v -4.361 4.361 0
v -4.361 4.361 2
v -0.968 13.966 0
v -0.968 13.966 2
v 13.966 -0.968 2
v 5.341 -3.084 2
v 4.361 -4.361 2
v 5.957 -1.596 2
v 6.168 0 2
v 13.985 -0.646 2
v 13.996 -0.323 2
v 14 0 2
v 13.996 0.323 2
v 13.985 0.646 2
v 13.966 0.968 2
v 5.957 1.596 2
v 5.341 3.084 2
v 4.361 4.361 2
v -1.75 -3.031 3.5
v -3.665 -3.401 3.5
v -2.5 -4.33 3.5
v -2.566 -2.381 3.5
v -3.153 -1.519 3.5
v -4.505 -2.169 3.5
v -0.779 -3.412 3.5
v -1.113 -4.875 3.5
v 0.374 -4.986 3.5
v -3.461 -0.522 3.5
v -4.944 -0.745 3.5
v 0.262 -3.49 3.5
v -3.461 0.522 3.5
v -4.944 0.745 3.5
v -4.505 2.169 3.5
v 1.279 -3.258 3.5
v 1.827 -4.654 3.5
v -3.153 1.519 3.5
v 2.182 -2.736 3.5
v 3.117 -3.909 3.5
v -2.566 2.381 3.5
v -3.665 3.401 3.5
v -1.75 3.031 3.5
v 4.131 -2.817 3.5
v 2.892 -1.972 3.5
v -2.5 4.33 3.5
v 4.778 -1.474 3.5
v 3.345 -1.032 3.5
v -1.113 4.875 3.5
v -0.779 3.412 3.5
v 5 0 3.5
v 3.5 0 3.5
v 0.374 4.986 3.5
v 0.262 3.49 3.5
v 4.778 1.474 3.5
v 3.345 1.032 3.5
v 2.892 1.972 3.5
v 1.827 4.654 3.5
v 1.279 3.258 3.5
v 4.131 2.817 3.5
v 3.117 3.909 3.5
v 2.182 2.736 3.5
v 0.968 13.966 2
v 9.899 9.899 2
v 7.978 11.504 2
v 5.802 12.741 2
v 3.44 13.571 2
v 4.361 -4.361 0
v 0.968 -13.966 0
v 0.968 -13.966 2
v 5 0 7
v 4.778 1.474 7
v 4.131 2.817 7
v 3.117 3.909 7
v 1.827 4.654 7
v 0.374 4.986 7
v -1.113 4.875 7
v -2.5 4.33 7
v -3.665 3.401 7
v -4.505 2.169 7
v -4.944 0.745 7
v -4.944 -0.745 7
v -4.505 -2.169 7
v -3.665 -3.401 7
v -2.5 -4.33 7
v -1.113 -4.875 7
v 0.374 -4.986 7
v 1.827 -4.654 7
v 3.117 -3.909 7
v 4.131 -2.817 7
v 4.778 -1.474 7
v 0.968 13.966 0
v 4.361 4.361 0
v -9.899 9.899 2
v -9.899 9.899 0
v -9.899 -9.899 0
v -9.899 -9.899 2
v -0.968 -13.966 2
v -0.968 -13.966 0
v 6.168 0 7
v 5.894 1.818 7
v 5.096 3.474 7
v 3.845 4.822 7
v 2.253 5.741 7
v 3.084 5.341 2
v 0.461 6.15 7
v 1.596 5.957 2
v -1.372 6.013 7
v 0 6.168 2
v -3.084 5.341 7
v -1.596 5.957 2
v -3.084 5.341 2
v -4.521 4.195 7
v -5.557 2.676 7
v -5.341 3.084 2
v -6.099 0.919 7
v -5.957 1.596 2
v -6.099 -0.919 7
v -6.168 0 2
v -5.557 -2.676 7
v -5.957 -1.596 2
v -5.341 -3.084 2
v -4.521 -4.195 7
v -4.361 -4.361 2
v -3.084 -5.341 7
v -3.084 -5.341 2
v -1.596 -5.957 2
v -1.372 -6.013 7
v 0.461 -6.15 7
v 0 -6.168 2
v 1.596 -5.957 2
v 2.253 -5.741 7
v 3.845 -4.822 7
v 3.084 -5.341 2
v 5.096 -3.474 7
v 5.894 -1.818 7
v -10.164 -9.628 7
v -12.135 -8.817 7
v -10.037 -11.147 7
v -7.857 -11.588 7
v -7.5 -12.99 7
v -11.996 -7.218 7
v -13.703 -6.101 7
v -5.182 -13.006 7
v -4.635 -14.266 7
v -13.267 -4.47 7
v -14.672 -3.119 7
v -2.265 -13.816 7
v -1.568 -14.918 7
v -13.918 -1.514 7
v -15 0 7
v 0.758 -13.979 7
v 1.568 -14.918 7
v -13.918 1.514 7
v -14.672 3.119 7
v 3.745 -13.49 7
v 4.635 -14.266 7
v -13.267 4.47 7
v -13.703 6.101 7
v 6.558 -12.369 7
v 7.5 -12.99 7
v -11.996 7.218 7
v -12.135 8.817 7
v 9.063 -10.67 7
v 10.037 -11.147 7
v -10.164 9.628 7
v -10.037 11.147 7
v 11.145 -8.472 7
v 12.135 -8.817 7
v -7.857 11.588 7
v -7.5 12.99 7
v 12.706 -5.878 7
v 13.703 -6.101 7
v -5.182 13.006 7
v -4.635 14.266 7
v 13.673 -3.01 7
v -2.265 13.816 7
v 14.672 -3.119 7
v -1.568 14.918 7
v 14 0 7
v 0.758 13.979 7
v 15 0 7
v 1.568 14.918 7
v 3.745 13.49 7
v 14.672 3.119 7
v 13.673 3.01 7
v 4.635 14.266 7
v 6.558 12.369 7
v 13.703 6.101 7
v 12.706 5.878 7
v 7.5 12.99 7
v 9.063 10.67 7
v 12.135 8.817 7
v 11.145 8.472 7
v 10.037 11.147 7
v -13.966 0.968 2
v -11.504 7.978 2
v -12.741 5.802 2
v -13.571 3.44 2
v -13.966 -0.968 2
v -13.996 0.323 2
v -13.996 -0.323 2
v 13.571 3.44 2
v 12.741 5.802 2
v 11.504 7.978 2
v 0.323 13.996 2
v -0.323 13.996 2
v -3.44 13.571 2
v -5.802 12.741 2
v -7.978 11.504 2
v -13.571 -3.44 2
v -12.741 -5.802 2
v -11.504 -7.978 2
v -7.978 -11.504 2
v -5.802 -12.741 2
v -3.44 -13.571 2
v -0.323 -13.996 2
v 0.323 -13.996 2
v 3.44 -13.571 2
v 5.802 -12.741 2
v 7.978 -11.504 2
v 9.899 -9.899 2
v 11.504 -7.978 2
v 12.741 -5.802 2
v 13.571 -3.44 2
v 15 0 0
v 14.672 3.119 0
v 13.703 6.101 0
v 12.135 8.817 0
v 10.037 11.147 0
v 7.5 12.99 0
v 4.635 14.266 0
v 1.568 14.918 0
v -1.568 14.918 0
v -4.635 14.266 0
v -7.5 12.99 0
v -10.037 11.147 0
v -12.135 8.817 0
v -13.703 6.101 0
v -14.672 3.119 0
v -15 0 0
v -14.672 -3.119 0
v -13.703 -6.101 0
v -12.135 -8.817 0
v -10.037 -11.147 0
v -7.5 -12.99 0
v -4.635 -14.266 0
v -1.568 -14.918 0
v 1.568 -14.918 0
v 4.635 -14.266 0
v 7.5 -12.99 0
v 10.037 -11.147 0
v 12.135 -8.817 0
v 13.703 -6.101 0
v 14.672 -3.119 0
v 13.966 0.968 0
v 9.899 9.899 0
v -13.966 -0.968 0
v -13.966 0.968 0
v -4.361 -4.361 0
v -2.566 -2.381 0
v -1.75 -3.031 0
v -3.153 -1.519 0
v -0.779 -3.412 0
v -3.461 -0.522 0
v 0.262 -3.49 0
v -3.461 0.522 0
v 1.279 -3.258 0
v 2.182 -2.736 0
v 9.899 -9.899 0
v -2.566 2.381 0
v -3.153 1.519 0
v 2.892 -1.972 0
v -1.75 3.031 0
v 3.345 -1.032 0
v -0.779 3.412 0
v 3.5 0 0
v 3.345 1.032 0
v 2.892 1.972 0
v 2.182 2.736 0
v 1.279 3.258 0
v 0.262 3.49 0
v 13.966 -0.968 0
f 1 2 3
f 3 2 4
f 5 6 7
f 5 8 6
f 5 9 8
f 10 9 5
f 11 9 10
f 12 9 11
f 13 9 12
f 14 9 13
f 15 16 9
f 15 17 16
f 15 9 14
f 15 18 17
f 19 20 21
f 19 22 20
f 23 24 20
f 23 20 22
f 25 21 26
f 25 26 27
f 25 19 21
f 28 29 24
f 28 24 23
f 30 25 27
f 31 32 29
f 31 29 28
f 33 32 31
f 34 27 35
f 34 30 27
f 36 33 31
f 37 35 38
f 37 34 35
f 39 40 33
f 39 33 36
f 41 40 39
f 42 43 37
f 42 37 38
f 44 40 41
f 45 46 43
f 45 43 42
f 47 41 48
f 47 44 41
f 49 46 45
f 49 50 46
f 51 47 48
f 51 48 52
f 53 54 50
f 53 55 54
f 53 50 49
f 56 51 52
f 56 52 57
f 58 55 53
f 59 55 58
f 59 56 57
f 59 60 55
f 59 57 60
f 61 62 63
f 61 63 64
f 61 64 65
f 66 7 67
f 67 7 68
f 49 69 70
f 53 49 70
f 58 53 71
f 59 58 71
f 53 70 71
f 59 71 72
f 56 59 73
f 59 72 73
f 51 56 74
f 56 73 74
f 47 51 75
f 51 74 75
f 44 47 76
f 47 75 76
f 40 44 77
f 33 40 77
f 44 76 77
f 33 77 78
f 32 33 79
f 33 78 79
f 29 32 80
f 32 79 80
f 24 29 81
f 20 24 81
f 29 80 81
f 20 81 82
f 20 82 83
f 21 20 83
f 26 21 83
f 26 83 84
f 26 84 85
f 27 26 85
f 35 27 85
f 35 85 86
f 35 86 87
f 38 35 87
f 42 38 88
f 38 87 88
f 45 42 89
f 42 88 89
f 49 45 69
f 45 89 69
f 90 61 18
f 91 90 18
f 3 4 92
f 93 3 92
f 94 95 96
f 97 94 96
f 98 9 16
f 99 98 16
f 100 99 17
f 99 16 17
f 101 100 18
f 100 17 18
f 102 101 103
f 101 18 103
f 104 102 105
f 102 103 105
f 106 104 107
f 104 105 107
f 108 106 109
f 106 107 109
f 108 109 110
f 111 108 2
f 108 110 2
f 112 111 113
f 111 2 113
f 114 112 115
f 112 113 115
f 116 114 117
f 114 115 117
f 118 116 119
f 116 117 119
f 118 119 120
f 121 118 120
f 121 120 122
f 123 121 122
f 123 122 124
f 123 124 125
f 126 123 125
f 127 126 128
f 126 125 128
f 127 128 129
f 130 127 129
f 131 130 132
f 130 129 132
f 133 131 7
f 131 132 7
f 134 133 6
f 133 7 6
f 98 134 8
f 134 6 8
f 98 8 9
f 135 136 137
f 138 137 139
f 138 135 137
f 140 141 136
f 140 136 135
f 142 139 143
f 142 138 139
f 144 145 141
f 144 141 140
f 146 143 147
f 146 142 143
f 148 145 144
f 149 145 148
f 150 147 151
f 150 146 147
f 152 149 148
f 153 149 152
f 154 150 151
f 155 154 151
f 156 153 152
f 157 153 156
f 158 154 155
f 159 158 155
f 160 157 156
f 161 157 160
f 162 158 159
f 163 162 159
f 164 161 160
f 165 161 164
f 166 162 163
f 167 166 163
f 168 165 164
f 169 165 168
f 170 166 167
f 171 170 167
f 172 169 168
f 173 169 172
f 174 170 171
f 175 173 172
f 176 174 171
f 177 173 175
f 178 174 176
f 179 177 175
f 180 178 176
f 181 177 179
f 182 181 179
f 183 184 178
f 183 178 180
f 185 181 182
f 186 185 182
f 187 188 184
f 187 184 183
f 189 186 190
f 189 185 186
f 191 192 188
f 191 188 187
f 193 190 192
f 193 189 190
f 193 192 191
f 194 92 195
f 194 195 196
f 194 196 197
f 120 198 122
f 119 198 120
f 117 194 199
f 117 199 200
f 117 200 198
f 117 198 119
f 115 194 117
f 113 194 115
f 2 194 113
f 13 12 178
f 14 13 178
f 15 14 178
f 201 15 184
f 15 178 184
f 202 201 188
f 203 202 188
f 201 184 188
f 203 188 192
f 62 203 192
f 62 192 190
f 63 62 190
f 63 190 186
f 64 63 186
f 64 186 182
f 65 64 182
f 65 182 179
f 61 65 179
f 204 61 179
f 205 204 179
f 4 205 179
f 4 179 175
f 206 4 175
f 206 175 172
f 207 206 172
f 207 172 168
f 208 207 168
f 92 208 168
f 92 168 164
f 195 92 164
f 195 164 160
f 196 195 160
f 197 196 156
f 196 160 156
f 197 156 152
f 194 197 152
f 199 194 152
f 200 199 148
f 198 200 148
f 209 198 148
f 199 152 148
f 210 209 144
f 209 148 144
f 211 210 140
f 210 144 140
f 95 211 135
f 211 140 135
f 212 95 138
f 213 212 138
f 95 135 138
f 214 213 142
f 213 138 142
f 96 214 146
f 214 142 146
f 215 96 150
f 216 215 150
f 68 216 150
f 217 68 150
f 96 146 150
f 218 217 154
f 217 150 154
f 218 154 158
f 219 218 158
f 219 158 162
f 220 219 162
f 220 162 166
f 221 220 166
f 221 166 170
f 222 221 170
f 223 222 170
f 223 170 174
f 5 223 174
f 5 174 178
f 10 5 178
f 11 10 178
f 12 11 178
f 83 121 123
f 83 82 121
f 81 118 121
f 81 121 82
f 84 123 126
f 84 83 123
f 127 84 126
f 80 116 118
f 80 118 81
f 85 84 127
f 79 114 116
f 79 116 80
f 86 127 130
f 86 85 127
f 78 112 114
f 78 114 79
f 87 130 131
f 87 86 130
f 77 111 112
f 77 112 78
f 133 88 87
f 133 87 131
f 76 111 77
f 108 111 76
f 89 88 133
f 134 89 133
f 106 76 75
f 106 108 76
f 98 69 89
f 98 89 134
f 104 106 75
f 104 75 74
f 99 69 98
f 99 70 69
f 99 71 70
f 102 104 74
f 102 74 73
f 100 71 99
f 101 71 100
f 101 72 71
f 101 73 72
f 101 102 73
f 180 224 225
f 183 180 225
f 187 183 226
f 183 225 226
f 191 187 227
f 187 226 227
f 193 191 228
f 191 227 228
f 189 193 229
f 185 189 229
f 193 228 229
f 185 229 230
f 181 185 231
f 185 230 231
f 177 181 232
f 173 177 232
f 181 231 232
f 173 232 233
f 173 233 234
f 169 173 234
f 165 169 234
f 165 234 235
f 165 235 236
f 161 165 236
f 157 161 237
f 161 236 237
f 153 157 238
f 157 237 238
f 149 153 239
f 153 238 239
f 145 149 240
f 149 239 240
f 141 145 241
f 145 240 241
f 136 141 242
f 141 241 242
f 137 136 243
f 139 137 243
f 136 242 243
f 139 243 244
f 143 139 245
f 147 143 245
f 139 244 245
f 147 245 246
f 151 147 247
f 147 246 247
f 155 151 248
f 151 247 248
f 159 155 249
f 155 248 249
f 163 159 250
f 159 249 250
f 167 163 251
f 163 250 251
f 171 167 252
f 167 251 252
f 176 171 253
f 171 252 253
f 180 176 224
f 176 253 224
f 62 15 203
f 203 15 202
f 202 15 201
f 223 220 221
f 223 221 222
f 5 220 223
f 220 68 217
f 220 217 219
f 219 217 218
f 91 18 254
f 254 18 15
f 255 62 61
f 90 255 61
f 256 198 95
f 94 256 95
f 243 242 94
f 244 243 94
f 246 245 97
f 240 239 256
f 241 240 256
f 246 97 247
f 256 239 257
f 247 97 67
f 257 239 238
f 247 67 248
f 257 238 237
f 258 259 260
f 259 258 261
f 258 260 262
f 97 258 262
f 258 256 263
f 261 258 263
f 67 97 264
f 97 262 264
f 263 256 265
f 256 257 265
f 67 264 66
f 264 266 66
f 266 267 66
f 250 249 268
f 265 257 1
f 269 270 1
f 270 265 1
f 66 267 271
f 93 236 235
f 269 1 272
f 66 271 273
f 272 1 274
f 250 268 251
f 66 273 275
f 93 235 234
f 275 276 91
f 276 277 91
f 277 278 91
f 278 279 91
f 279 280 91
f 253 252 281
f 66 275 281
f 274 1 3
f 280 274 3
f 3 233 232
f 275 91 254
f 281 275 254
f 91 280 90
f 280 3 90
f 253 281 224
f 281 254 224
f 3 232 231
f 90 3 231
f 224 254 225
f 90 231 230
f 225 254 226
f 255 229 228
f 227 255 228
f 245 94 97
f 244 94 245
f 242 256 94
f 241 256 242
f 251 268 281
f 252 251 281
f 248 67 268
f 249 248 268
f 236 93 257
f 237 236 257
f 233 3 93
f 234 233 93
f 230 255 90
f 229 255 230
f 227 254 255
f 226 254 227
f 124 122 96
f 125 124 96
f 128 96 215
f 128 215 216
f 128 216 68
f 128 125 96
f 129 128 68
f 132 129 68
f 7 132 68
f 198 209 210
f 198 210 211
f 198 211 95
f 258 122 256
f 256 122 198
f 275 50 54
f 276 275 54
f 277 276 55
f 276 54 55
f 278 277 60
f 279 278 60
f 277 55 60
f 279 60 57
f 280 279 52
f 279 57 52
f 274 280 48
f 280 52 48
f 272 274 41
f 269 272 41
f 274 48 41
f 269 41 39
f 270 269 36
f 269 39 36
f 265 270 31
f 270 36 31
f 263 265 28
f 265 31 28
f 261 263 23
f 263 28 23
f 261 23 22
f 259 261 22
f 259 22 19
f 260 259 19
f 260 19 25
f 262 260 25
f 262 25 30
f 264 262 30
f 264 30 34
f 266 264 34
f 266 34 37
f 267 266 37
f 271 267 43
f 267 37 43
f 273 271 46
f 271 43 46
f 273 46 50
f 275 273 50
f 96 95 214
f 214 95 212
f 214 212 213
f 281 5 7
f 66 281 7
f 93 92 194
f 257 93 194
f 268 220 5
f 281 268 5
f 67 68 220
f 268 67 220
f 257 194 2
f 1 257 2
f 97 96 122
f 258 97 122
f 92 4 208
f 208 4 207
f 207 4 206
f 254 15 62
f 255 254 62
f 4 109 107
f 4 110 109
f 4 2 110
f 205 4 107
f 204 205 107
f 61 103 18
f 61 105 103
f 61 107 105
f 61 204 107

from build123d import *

# Parameters (mm, degrees)
F0_R      = 15
F1_DEPTH  = 7
F2_R      = 14
F3_DEPTH  = 5
F4_R      = 6.167621
F5_DEPTH  = 5
F6_R      = 5
F7_DEPTH  = 3.5
F8_R      = 3.5
F9_DEPTH  = 3.5
F11_DEPTH = 2


with BuildPart() as f1:
    # F0 (on Top) → F1 (new body)
    with BuildSketch(Plane.XY):
        Circle(F0_R)
    extrude(amount=F1_DEPTH)

    # F2 (on face) → F3 (cut)
    with BuildSketch(Plane.XY.offset(7)):
        Circle(F2_R)
    extrude(amount=-F3_DEPTH, mode=Mode.SUBTRACT)

    # F4 (on face) → F5 (join)
    with BuildSketch(Plane.XY.offset(2)):
        Circle(F4_R)
    extrude(amount=F5_DEPTH)

    # F6 (on face) → F7 (cut)
    with BuildSketch(Plane.XY.offset(7)):
        Circle(F6_R)
    extrude(amount=-F7_DEPTH, mode=Mode.SUBTRACT)

    # F8 (on face) → F9 (cut, through all)
    with BuildSketch(Plane.XY.offset(3.5)):
        Circle(F8_R)
    extrude(amount=-F9_DEPTH, mode=Mode.SUBTRACT)

    # F10 (on face) → F11 (cut, through all)
    with BuildSketch(Plane.XY.offset(2)):
        Polygon((0.968024, 13.966493), (4.361166, 4.361166), (13.966493, 0.968024), (9.899495, 9.899495), align=None)
        Polygon((-13.966493, 0.968024), (-4.361166, 4.361166), (-0.968024, 13.966493), (-9.899495, 9.899495), align=None)
        Polygon((-0.968024, -13.966493), (-4.361166, -4.361166), (-13.966493, -0.968024), (-9.899495, -9.899495), align=None)
        Polygon((13.966493, -0.968024), (4.361166, -4.361166), (0.968024, -13.966493), (9.899495, -9.899495), align=None)
    extrude(amount=-F11_DEPTH, mode=Mode.SUBTRACT)


solid = f1.part
